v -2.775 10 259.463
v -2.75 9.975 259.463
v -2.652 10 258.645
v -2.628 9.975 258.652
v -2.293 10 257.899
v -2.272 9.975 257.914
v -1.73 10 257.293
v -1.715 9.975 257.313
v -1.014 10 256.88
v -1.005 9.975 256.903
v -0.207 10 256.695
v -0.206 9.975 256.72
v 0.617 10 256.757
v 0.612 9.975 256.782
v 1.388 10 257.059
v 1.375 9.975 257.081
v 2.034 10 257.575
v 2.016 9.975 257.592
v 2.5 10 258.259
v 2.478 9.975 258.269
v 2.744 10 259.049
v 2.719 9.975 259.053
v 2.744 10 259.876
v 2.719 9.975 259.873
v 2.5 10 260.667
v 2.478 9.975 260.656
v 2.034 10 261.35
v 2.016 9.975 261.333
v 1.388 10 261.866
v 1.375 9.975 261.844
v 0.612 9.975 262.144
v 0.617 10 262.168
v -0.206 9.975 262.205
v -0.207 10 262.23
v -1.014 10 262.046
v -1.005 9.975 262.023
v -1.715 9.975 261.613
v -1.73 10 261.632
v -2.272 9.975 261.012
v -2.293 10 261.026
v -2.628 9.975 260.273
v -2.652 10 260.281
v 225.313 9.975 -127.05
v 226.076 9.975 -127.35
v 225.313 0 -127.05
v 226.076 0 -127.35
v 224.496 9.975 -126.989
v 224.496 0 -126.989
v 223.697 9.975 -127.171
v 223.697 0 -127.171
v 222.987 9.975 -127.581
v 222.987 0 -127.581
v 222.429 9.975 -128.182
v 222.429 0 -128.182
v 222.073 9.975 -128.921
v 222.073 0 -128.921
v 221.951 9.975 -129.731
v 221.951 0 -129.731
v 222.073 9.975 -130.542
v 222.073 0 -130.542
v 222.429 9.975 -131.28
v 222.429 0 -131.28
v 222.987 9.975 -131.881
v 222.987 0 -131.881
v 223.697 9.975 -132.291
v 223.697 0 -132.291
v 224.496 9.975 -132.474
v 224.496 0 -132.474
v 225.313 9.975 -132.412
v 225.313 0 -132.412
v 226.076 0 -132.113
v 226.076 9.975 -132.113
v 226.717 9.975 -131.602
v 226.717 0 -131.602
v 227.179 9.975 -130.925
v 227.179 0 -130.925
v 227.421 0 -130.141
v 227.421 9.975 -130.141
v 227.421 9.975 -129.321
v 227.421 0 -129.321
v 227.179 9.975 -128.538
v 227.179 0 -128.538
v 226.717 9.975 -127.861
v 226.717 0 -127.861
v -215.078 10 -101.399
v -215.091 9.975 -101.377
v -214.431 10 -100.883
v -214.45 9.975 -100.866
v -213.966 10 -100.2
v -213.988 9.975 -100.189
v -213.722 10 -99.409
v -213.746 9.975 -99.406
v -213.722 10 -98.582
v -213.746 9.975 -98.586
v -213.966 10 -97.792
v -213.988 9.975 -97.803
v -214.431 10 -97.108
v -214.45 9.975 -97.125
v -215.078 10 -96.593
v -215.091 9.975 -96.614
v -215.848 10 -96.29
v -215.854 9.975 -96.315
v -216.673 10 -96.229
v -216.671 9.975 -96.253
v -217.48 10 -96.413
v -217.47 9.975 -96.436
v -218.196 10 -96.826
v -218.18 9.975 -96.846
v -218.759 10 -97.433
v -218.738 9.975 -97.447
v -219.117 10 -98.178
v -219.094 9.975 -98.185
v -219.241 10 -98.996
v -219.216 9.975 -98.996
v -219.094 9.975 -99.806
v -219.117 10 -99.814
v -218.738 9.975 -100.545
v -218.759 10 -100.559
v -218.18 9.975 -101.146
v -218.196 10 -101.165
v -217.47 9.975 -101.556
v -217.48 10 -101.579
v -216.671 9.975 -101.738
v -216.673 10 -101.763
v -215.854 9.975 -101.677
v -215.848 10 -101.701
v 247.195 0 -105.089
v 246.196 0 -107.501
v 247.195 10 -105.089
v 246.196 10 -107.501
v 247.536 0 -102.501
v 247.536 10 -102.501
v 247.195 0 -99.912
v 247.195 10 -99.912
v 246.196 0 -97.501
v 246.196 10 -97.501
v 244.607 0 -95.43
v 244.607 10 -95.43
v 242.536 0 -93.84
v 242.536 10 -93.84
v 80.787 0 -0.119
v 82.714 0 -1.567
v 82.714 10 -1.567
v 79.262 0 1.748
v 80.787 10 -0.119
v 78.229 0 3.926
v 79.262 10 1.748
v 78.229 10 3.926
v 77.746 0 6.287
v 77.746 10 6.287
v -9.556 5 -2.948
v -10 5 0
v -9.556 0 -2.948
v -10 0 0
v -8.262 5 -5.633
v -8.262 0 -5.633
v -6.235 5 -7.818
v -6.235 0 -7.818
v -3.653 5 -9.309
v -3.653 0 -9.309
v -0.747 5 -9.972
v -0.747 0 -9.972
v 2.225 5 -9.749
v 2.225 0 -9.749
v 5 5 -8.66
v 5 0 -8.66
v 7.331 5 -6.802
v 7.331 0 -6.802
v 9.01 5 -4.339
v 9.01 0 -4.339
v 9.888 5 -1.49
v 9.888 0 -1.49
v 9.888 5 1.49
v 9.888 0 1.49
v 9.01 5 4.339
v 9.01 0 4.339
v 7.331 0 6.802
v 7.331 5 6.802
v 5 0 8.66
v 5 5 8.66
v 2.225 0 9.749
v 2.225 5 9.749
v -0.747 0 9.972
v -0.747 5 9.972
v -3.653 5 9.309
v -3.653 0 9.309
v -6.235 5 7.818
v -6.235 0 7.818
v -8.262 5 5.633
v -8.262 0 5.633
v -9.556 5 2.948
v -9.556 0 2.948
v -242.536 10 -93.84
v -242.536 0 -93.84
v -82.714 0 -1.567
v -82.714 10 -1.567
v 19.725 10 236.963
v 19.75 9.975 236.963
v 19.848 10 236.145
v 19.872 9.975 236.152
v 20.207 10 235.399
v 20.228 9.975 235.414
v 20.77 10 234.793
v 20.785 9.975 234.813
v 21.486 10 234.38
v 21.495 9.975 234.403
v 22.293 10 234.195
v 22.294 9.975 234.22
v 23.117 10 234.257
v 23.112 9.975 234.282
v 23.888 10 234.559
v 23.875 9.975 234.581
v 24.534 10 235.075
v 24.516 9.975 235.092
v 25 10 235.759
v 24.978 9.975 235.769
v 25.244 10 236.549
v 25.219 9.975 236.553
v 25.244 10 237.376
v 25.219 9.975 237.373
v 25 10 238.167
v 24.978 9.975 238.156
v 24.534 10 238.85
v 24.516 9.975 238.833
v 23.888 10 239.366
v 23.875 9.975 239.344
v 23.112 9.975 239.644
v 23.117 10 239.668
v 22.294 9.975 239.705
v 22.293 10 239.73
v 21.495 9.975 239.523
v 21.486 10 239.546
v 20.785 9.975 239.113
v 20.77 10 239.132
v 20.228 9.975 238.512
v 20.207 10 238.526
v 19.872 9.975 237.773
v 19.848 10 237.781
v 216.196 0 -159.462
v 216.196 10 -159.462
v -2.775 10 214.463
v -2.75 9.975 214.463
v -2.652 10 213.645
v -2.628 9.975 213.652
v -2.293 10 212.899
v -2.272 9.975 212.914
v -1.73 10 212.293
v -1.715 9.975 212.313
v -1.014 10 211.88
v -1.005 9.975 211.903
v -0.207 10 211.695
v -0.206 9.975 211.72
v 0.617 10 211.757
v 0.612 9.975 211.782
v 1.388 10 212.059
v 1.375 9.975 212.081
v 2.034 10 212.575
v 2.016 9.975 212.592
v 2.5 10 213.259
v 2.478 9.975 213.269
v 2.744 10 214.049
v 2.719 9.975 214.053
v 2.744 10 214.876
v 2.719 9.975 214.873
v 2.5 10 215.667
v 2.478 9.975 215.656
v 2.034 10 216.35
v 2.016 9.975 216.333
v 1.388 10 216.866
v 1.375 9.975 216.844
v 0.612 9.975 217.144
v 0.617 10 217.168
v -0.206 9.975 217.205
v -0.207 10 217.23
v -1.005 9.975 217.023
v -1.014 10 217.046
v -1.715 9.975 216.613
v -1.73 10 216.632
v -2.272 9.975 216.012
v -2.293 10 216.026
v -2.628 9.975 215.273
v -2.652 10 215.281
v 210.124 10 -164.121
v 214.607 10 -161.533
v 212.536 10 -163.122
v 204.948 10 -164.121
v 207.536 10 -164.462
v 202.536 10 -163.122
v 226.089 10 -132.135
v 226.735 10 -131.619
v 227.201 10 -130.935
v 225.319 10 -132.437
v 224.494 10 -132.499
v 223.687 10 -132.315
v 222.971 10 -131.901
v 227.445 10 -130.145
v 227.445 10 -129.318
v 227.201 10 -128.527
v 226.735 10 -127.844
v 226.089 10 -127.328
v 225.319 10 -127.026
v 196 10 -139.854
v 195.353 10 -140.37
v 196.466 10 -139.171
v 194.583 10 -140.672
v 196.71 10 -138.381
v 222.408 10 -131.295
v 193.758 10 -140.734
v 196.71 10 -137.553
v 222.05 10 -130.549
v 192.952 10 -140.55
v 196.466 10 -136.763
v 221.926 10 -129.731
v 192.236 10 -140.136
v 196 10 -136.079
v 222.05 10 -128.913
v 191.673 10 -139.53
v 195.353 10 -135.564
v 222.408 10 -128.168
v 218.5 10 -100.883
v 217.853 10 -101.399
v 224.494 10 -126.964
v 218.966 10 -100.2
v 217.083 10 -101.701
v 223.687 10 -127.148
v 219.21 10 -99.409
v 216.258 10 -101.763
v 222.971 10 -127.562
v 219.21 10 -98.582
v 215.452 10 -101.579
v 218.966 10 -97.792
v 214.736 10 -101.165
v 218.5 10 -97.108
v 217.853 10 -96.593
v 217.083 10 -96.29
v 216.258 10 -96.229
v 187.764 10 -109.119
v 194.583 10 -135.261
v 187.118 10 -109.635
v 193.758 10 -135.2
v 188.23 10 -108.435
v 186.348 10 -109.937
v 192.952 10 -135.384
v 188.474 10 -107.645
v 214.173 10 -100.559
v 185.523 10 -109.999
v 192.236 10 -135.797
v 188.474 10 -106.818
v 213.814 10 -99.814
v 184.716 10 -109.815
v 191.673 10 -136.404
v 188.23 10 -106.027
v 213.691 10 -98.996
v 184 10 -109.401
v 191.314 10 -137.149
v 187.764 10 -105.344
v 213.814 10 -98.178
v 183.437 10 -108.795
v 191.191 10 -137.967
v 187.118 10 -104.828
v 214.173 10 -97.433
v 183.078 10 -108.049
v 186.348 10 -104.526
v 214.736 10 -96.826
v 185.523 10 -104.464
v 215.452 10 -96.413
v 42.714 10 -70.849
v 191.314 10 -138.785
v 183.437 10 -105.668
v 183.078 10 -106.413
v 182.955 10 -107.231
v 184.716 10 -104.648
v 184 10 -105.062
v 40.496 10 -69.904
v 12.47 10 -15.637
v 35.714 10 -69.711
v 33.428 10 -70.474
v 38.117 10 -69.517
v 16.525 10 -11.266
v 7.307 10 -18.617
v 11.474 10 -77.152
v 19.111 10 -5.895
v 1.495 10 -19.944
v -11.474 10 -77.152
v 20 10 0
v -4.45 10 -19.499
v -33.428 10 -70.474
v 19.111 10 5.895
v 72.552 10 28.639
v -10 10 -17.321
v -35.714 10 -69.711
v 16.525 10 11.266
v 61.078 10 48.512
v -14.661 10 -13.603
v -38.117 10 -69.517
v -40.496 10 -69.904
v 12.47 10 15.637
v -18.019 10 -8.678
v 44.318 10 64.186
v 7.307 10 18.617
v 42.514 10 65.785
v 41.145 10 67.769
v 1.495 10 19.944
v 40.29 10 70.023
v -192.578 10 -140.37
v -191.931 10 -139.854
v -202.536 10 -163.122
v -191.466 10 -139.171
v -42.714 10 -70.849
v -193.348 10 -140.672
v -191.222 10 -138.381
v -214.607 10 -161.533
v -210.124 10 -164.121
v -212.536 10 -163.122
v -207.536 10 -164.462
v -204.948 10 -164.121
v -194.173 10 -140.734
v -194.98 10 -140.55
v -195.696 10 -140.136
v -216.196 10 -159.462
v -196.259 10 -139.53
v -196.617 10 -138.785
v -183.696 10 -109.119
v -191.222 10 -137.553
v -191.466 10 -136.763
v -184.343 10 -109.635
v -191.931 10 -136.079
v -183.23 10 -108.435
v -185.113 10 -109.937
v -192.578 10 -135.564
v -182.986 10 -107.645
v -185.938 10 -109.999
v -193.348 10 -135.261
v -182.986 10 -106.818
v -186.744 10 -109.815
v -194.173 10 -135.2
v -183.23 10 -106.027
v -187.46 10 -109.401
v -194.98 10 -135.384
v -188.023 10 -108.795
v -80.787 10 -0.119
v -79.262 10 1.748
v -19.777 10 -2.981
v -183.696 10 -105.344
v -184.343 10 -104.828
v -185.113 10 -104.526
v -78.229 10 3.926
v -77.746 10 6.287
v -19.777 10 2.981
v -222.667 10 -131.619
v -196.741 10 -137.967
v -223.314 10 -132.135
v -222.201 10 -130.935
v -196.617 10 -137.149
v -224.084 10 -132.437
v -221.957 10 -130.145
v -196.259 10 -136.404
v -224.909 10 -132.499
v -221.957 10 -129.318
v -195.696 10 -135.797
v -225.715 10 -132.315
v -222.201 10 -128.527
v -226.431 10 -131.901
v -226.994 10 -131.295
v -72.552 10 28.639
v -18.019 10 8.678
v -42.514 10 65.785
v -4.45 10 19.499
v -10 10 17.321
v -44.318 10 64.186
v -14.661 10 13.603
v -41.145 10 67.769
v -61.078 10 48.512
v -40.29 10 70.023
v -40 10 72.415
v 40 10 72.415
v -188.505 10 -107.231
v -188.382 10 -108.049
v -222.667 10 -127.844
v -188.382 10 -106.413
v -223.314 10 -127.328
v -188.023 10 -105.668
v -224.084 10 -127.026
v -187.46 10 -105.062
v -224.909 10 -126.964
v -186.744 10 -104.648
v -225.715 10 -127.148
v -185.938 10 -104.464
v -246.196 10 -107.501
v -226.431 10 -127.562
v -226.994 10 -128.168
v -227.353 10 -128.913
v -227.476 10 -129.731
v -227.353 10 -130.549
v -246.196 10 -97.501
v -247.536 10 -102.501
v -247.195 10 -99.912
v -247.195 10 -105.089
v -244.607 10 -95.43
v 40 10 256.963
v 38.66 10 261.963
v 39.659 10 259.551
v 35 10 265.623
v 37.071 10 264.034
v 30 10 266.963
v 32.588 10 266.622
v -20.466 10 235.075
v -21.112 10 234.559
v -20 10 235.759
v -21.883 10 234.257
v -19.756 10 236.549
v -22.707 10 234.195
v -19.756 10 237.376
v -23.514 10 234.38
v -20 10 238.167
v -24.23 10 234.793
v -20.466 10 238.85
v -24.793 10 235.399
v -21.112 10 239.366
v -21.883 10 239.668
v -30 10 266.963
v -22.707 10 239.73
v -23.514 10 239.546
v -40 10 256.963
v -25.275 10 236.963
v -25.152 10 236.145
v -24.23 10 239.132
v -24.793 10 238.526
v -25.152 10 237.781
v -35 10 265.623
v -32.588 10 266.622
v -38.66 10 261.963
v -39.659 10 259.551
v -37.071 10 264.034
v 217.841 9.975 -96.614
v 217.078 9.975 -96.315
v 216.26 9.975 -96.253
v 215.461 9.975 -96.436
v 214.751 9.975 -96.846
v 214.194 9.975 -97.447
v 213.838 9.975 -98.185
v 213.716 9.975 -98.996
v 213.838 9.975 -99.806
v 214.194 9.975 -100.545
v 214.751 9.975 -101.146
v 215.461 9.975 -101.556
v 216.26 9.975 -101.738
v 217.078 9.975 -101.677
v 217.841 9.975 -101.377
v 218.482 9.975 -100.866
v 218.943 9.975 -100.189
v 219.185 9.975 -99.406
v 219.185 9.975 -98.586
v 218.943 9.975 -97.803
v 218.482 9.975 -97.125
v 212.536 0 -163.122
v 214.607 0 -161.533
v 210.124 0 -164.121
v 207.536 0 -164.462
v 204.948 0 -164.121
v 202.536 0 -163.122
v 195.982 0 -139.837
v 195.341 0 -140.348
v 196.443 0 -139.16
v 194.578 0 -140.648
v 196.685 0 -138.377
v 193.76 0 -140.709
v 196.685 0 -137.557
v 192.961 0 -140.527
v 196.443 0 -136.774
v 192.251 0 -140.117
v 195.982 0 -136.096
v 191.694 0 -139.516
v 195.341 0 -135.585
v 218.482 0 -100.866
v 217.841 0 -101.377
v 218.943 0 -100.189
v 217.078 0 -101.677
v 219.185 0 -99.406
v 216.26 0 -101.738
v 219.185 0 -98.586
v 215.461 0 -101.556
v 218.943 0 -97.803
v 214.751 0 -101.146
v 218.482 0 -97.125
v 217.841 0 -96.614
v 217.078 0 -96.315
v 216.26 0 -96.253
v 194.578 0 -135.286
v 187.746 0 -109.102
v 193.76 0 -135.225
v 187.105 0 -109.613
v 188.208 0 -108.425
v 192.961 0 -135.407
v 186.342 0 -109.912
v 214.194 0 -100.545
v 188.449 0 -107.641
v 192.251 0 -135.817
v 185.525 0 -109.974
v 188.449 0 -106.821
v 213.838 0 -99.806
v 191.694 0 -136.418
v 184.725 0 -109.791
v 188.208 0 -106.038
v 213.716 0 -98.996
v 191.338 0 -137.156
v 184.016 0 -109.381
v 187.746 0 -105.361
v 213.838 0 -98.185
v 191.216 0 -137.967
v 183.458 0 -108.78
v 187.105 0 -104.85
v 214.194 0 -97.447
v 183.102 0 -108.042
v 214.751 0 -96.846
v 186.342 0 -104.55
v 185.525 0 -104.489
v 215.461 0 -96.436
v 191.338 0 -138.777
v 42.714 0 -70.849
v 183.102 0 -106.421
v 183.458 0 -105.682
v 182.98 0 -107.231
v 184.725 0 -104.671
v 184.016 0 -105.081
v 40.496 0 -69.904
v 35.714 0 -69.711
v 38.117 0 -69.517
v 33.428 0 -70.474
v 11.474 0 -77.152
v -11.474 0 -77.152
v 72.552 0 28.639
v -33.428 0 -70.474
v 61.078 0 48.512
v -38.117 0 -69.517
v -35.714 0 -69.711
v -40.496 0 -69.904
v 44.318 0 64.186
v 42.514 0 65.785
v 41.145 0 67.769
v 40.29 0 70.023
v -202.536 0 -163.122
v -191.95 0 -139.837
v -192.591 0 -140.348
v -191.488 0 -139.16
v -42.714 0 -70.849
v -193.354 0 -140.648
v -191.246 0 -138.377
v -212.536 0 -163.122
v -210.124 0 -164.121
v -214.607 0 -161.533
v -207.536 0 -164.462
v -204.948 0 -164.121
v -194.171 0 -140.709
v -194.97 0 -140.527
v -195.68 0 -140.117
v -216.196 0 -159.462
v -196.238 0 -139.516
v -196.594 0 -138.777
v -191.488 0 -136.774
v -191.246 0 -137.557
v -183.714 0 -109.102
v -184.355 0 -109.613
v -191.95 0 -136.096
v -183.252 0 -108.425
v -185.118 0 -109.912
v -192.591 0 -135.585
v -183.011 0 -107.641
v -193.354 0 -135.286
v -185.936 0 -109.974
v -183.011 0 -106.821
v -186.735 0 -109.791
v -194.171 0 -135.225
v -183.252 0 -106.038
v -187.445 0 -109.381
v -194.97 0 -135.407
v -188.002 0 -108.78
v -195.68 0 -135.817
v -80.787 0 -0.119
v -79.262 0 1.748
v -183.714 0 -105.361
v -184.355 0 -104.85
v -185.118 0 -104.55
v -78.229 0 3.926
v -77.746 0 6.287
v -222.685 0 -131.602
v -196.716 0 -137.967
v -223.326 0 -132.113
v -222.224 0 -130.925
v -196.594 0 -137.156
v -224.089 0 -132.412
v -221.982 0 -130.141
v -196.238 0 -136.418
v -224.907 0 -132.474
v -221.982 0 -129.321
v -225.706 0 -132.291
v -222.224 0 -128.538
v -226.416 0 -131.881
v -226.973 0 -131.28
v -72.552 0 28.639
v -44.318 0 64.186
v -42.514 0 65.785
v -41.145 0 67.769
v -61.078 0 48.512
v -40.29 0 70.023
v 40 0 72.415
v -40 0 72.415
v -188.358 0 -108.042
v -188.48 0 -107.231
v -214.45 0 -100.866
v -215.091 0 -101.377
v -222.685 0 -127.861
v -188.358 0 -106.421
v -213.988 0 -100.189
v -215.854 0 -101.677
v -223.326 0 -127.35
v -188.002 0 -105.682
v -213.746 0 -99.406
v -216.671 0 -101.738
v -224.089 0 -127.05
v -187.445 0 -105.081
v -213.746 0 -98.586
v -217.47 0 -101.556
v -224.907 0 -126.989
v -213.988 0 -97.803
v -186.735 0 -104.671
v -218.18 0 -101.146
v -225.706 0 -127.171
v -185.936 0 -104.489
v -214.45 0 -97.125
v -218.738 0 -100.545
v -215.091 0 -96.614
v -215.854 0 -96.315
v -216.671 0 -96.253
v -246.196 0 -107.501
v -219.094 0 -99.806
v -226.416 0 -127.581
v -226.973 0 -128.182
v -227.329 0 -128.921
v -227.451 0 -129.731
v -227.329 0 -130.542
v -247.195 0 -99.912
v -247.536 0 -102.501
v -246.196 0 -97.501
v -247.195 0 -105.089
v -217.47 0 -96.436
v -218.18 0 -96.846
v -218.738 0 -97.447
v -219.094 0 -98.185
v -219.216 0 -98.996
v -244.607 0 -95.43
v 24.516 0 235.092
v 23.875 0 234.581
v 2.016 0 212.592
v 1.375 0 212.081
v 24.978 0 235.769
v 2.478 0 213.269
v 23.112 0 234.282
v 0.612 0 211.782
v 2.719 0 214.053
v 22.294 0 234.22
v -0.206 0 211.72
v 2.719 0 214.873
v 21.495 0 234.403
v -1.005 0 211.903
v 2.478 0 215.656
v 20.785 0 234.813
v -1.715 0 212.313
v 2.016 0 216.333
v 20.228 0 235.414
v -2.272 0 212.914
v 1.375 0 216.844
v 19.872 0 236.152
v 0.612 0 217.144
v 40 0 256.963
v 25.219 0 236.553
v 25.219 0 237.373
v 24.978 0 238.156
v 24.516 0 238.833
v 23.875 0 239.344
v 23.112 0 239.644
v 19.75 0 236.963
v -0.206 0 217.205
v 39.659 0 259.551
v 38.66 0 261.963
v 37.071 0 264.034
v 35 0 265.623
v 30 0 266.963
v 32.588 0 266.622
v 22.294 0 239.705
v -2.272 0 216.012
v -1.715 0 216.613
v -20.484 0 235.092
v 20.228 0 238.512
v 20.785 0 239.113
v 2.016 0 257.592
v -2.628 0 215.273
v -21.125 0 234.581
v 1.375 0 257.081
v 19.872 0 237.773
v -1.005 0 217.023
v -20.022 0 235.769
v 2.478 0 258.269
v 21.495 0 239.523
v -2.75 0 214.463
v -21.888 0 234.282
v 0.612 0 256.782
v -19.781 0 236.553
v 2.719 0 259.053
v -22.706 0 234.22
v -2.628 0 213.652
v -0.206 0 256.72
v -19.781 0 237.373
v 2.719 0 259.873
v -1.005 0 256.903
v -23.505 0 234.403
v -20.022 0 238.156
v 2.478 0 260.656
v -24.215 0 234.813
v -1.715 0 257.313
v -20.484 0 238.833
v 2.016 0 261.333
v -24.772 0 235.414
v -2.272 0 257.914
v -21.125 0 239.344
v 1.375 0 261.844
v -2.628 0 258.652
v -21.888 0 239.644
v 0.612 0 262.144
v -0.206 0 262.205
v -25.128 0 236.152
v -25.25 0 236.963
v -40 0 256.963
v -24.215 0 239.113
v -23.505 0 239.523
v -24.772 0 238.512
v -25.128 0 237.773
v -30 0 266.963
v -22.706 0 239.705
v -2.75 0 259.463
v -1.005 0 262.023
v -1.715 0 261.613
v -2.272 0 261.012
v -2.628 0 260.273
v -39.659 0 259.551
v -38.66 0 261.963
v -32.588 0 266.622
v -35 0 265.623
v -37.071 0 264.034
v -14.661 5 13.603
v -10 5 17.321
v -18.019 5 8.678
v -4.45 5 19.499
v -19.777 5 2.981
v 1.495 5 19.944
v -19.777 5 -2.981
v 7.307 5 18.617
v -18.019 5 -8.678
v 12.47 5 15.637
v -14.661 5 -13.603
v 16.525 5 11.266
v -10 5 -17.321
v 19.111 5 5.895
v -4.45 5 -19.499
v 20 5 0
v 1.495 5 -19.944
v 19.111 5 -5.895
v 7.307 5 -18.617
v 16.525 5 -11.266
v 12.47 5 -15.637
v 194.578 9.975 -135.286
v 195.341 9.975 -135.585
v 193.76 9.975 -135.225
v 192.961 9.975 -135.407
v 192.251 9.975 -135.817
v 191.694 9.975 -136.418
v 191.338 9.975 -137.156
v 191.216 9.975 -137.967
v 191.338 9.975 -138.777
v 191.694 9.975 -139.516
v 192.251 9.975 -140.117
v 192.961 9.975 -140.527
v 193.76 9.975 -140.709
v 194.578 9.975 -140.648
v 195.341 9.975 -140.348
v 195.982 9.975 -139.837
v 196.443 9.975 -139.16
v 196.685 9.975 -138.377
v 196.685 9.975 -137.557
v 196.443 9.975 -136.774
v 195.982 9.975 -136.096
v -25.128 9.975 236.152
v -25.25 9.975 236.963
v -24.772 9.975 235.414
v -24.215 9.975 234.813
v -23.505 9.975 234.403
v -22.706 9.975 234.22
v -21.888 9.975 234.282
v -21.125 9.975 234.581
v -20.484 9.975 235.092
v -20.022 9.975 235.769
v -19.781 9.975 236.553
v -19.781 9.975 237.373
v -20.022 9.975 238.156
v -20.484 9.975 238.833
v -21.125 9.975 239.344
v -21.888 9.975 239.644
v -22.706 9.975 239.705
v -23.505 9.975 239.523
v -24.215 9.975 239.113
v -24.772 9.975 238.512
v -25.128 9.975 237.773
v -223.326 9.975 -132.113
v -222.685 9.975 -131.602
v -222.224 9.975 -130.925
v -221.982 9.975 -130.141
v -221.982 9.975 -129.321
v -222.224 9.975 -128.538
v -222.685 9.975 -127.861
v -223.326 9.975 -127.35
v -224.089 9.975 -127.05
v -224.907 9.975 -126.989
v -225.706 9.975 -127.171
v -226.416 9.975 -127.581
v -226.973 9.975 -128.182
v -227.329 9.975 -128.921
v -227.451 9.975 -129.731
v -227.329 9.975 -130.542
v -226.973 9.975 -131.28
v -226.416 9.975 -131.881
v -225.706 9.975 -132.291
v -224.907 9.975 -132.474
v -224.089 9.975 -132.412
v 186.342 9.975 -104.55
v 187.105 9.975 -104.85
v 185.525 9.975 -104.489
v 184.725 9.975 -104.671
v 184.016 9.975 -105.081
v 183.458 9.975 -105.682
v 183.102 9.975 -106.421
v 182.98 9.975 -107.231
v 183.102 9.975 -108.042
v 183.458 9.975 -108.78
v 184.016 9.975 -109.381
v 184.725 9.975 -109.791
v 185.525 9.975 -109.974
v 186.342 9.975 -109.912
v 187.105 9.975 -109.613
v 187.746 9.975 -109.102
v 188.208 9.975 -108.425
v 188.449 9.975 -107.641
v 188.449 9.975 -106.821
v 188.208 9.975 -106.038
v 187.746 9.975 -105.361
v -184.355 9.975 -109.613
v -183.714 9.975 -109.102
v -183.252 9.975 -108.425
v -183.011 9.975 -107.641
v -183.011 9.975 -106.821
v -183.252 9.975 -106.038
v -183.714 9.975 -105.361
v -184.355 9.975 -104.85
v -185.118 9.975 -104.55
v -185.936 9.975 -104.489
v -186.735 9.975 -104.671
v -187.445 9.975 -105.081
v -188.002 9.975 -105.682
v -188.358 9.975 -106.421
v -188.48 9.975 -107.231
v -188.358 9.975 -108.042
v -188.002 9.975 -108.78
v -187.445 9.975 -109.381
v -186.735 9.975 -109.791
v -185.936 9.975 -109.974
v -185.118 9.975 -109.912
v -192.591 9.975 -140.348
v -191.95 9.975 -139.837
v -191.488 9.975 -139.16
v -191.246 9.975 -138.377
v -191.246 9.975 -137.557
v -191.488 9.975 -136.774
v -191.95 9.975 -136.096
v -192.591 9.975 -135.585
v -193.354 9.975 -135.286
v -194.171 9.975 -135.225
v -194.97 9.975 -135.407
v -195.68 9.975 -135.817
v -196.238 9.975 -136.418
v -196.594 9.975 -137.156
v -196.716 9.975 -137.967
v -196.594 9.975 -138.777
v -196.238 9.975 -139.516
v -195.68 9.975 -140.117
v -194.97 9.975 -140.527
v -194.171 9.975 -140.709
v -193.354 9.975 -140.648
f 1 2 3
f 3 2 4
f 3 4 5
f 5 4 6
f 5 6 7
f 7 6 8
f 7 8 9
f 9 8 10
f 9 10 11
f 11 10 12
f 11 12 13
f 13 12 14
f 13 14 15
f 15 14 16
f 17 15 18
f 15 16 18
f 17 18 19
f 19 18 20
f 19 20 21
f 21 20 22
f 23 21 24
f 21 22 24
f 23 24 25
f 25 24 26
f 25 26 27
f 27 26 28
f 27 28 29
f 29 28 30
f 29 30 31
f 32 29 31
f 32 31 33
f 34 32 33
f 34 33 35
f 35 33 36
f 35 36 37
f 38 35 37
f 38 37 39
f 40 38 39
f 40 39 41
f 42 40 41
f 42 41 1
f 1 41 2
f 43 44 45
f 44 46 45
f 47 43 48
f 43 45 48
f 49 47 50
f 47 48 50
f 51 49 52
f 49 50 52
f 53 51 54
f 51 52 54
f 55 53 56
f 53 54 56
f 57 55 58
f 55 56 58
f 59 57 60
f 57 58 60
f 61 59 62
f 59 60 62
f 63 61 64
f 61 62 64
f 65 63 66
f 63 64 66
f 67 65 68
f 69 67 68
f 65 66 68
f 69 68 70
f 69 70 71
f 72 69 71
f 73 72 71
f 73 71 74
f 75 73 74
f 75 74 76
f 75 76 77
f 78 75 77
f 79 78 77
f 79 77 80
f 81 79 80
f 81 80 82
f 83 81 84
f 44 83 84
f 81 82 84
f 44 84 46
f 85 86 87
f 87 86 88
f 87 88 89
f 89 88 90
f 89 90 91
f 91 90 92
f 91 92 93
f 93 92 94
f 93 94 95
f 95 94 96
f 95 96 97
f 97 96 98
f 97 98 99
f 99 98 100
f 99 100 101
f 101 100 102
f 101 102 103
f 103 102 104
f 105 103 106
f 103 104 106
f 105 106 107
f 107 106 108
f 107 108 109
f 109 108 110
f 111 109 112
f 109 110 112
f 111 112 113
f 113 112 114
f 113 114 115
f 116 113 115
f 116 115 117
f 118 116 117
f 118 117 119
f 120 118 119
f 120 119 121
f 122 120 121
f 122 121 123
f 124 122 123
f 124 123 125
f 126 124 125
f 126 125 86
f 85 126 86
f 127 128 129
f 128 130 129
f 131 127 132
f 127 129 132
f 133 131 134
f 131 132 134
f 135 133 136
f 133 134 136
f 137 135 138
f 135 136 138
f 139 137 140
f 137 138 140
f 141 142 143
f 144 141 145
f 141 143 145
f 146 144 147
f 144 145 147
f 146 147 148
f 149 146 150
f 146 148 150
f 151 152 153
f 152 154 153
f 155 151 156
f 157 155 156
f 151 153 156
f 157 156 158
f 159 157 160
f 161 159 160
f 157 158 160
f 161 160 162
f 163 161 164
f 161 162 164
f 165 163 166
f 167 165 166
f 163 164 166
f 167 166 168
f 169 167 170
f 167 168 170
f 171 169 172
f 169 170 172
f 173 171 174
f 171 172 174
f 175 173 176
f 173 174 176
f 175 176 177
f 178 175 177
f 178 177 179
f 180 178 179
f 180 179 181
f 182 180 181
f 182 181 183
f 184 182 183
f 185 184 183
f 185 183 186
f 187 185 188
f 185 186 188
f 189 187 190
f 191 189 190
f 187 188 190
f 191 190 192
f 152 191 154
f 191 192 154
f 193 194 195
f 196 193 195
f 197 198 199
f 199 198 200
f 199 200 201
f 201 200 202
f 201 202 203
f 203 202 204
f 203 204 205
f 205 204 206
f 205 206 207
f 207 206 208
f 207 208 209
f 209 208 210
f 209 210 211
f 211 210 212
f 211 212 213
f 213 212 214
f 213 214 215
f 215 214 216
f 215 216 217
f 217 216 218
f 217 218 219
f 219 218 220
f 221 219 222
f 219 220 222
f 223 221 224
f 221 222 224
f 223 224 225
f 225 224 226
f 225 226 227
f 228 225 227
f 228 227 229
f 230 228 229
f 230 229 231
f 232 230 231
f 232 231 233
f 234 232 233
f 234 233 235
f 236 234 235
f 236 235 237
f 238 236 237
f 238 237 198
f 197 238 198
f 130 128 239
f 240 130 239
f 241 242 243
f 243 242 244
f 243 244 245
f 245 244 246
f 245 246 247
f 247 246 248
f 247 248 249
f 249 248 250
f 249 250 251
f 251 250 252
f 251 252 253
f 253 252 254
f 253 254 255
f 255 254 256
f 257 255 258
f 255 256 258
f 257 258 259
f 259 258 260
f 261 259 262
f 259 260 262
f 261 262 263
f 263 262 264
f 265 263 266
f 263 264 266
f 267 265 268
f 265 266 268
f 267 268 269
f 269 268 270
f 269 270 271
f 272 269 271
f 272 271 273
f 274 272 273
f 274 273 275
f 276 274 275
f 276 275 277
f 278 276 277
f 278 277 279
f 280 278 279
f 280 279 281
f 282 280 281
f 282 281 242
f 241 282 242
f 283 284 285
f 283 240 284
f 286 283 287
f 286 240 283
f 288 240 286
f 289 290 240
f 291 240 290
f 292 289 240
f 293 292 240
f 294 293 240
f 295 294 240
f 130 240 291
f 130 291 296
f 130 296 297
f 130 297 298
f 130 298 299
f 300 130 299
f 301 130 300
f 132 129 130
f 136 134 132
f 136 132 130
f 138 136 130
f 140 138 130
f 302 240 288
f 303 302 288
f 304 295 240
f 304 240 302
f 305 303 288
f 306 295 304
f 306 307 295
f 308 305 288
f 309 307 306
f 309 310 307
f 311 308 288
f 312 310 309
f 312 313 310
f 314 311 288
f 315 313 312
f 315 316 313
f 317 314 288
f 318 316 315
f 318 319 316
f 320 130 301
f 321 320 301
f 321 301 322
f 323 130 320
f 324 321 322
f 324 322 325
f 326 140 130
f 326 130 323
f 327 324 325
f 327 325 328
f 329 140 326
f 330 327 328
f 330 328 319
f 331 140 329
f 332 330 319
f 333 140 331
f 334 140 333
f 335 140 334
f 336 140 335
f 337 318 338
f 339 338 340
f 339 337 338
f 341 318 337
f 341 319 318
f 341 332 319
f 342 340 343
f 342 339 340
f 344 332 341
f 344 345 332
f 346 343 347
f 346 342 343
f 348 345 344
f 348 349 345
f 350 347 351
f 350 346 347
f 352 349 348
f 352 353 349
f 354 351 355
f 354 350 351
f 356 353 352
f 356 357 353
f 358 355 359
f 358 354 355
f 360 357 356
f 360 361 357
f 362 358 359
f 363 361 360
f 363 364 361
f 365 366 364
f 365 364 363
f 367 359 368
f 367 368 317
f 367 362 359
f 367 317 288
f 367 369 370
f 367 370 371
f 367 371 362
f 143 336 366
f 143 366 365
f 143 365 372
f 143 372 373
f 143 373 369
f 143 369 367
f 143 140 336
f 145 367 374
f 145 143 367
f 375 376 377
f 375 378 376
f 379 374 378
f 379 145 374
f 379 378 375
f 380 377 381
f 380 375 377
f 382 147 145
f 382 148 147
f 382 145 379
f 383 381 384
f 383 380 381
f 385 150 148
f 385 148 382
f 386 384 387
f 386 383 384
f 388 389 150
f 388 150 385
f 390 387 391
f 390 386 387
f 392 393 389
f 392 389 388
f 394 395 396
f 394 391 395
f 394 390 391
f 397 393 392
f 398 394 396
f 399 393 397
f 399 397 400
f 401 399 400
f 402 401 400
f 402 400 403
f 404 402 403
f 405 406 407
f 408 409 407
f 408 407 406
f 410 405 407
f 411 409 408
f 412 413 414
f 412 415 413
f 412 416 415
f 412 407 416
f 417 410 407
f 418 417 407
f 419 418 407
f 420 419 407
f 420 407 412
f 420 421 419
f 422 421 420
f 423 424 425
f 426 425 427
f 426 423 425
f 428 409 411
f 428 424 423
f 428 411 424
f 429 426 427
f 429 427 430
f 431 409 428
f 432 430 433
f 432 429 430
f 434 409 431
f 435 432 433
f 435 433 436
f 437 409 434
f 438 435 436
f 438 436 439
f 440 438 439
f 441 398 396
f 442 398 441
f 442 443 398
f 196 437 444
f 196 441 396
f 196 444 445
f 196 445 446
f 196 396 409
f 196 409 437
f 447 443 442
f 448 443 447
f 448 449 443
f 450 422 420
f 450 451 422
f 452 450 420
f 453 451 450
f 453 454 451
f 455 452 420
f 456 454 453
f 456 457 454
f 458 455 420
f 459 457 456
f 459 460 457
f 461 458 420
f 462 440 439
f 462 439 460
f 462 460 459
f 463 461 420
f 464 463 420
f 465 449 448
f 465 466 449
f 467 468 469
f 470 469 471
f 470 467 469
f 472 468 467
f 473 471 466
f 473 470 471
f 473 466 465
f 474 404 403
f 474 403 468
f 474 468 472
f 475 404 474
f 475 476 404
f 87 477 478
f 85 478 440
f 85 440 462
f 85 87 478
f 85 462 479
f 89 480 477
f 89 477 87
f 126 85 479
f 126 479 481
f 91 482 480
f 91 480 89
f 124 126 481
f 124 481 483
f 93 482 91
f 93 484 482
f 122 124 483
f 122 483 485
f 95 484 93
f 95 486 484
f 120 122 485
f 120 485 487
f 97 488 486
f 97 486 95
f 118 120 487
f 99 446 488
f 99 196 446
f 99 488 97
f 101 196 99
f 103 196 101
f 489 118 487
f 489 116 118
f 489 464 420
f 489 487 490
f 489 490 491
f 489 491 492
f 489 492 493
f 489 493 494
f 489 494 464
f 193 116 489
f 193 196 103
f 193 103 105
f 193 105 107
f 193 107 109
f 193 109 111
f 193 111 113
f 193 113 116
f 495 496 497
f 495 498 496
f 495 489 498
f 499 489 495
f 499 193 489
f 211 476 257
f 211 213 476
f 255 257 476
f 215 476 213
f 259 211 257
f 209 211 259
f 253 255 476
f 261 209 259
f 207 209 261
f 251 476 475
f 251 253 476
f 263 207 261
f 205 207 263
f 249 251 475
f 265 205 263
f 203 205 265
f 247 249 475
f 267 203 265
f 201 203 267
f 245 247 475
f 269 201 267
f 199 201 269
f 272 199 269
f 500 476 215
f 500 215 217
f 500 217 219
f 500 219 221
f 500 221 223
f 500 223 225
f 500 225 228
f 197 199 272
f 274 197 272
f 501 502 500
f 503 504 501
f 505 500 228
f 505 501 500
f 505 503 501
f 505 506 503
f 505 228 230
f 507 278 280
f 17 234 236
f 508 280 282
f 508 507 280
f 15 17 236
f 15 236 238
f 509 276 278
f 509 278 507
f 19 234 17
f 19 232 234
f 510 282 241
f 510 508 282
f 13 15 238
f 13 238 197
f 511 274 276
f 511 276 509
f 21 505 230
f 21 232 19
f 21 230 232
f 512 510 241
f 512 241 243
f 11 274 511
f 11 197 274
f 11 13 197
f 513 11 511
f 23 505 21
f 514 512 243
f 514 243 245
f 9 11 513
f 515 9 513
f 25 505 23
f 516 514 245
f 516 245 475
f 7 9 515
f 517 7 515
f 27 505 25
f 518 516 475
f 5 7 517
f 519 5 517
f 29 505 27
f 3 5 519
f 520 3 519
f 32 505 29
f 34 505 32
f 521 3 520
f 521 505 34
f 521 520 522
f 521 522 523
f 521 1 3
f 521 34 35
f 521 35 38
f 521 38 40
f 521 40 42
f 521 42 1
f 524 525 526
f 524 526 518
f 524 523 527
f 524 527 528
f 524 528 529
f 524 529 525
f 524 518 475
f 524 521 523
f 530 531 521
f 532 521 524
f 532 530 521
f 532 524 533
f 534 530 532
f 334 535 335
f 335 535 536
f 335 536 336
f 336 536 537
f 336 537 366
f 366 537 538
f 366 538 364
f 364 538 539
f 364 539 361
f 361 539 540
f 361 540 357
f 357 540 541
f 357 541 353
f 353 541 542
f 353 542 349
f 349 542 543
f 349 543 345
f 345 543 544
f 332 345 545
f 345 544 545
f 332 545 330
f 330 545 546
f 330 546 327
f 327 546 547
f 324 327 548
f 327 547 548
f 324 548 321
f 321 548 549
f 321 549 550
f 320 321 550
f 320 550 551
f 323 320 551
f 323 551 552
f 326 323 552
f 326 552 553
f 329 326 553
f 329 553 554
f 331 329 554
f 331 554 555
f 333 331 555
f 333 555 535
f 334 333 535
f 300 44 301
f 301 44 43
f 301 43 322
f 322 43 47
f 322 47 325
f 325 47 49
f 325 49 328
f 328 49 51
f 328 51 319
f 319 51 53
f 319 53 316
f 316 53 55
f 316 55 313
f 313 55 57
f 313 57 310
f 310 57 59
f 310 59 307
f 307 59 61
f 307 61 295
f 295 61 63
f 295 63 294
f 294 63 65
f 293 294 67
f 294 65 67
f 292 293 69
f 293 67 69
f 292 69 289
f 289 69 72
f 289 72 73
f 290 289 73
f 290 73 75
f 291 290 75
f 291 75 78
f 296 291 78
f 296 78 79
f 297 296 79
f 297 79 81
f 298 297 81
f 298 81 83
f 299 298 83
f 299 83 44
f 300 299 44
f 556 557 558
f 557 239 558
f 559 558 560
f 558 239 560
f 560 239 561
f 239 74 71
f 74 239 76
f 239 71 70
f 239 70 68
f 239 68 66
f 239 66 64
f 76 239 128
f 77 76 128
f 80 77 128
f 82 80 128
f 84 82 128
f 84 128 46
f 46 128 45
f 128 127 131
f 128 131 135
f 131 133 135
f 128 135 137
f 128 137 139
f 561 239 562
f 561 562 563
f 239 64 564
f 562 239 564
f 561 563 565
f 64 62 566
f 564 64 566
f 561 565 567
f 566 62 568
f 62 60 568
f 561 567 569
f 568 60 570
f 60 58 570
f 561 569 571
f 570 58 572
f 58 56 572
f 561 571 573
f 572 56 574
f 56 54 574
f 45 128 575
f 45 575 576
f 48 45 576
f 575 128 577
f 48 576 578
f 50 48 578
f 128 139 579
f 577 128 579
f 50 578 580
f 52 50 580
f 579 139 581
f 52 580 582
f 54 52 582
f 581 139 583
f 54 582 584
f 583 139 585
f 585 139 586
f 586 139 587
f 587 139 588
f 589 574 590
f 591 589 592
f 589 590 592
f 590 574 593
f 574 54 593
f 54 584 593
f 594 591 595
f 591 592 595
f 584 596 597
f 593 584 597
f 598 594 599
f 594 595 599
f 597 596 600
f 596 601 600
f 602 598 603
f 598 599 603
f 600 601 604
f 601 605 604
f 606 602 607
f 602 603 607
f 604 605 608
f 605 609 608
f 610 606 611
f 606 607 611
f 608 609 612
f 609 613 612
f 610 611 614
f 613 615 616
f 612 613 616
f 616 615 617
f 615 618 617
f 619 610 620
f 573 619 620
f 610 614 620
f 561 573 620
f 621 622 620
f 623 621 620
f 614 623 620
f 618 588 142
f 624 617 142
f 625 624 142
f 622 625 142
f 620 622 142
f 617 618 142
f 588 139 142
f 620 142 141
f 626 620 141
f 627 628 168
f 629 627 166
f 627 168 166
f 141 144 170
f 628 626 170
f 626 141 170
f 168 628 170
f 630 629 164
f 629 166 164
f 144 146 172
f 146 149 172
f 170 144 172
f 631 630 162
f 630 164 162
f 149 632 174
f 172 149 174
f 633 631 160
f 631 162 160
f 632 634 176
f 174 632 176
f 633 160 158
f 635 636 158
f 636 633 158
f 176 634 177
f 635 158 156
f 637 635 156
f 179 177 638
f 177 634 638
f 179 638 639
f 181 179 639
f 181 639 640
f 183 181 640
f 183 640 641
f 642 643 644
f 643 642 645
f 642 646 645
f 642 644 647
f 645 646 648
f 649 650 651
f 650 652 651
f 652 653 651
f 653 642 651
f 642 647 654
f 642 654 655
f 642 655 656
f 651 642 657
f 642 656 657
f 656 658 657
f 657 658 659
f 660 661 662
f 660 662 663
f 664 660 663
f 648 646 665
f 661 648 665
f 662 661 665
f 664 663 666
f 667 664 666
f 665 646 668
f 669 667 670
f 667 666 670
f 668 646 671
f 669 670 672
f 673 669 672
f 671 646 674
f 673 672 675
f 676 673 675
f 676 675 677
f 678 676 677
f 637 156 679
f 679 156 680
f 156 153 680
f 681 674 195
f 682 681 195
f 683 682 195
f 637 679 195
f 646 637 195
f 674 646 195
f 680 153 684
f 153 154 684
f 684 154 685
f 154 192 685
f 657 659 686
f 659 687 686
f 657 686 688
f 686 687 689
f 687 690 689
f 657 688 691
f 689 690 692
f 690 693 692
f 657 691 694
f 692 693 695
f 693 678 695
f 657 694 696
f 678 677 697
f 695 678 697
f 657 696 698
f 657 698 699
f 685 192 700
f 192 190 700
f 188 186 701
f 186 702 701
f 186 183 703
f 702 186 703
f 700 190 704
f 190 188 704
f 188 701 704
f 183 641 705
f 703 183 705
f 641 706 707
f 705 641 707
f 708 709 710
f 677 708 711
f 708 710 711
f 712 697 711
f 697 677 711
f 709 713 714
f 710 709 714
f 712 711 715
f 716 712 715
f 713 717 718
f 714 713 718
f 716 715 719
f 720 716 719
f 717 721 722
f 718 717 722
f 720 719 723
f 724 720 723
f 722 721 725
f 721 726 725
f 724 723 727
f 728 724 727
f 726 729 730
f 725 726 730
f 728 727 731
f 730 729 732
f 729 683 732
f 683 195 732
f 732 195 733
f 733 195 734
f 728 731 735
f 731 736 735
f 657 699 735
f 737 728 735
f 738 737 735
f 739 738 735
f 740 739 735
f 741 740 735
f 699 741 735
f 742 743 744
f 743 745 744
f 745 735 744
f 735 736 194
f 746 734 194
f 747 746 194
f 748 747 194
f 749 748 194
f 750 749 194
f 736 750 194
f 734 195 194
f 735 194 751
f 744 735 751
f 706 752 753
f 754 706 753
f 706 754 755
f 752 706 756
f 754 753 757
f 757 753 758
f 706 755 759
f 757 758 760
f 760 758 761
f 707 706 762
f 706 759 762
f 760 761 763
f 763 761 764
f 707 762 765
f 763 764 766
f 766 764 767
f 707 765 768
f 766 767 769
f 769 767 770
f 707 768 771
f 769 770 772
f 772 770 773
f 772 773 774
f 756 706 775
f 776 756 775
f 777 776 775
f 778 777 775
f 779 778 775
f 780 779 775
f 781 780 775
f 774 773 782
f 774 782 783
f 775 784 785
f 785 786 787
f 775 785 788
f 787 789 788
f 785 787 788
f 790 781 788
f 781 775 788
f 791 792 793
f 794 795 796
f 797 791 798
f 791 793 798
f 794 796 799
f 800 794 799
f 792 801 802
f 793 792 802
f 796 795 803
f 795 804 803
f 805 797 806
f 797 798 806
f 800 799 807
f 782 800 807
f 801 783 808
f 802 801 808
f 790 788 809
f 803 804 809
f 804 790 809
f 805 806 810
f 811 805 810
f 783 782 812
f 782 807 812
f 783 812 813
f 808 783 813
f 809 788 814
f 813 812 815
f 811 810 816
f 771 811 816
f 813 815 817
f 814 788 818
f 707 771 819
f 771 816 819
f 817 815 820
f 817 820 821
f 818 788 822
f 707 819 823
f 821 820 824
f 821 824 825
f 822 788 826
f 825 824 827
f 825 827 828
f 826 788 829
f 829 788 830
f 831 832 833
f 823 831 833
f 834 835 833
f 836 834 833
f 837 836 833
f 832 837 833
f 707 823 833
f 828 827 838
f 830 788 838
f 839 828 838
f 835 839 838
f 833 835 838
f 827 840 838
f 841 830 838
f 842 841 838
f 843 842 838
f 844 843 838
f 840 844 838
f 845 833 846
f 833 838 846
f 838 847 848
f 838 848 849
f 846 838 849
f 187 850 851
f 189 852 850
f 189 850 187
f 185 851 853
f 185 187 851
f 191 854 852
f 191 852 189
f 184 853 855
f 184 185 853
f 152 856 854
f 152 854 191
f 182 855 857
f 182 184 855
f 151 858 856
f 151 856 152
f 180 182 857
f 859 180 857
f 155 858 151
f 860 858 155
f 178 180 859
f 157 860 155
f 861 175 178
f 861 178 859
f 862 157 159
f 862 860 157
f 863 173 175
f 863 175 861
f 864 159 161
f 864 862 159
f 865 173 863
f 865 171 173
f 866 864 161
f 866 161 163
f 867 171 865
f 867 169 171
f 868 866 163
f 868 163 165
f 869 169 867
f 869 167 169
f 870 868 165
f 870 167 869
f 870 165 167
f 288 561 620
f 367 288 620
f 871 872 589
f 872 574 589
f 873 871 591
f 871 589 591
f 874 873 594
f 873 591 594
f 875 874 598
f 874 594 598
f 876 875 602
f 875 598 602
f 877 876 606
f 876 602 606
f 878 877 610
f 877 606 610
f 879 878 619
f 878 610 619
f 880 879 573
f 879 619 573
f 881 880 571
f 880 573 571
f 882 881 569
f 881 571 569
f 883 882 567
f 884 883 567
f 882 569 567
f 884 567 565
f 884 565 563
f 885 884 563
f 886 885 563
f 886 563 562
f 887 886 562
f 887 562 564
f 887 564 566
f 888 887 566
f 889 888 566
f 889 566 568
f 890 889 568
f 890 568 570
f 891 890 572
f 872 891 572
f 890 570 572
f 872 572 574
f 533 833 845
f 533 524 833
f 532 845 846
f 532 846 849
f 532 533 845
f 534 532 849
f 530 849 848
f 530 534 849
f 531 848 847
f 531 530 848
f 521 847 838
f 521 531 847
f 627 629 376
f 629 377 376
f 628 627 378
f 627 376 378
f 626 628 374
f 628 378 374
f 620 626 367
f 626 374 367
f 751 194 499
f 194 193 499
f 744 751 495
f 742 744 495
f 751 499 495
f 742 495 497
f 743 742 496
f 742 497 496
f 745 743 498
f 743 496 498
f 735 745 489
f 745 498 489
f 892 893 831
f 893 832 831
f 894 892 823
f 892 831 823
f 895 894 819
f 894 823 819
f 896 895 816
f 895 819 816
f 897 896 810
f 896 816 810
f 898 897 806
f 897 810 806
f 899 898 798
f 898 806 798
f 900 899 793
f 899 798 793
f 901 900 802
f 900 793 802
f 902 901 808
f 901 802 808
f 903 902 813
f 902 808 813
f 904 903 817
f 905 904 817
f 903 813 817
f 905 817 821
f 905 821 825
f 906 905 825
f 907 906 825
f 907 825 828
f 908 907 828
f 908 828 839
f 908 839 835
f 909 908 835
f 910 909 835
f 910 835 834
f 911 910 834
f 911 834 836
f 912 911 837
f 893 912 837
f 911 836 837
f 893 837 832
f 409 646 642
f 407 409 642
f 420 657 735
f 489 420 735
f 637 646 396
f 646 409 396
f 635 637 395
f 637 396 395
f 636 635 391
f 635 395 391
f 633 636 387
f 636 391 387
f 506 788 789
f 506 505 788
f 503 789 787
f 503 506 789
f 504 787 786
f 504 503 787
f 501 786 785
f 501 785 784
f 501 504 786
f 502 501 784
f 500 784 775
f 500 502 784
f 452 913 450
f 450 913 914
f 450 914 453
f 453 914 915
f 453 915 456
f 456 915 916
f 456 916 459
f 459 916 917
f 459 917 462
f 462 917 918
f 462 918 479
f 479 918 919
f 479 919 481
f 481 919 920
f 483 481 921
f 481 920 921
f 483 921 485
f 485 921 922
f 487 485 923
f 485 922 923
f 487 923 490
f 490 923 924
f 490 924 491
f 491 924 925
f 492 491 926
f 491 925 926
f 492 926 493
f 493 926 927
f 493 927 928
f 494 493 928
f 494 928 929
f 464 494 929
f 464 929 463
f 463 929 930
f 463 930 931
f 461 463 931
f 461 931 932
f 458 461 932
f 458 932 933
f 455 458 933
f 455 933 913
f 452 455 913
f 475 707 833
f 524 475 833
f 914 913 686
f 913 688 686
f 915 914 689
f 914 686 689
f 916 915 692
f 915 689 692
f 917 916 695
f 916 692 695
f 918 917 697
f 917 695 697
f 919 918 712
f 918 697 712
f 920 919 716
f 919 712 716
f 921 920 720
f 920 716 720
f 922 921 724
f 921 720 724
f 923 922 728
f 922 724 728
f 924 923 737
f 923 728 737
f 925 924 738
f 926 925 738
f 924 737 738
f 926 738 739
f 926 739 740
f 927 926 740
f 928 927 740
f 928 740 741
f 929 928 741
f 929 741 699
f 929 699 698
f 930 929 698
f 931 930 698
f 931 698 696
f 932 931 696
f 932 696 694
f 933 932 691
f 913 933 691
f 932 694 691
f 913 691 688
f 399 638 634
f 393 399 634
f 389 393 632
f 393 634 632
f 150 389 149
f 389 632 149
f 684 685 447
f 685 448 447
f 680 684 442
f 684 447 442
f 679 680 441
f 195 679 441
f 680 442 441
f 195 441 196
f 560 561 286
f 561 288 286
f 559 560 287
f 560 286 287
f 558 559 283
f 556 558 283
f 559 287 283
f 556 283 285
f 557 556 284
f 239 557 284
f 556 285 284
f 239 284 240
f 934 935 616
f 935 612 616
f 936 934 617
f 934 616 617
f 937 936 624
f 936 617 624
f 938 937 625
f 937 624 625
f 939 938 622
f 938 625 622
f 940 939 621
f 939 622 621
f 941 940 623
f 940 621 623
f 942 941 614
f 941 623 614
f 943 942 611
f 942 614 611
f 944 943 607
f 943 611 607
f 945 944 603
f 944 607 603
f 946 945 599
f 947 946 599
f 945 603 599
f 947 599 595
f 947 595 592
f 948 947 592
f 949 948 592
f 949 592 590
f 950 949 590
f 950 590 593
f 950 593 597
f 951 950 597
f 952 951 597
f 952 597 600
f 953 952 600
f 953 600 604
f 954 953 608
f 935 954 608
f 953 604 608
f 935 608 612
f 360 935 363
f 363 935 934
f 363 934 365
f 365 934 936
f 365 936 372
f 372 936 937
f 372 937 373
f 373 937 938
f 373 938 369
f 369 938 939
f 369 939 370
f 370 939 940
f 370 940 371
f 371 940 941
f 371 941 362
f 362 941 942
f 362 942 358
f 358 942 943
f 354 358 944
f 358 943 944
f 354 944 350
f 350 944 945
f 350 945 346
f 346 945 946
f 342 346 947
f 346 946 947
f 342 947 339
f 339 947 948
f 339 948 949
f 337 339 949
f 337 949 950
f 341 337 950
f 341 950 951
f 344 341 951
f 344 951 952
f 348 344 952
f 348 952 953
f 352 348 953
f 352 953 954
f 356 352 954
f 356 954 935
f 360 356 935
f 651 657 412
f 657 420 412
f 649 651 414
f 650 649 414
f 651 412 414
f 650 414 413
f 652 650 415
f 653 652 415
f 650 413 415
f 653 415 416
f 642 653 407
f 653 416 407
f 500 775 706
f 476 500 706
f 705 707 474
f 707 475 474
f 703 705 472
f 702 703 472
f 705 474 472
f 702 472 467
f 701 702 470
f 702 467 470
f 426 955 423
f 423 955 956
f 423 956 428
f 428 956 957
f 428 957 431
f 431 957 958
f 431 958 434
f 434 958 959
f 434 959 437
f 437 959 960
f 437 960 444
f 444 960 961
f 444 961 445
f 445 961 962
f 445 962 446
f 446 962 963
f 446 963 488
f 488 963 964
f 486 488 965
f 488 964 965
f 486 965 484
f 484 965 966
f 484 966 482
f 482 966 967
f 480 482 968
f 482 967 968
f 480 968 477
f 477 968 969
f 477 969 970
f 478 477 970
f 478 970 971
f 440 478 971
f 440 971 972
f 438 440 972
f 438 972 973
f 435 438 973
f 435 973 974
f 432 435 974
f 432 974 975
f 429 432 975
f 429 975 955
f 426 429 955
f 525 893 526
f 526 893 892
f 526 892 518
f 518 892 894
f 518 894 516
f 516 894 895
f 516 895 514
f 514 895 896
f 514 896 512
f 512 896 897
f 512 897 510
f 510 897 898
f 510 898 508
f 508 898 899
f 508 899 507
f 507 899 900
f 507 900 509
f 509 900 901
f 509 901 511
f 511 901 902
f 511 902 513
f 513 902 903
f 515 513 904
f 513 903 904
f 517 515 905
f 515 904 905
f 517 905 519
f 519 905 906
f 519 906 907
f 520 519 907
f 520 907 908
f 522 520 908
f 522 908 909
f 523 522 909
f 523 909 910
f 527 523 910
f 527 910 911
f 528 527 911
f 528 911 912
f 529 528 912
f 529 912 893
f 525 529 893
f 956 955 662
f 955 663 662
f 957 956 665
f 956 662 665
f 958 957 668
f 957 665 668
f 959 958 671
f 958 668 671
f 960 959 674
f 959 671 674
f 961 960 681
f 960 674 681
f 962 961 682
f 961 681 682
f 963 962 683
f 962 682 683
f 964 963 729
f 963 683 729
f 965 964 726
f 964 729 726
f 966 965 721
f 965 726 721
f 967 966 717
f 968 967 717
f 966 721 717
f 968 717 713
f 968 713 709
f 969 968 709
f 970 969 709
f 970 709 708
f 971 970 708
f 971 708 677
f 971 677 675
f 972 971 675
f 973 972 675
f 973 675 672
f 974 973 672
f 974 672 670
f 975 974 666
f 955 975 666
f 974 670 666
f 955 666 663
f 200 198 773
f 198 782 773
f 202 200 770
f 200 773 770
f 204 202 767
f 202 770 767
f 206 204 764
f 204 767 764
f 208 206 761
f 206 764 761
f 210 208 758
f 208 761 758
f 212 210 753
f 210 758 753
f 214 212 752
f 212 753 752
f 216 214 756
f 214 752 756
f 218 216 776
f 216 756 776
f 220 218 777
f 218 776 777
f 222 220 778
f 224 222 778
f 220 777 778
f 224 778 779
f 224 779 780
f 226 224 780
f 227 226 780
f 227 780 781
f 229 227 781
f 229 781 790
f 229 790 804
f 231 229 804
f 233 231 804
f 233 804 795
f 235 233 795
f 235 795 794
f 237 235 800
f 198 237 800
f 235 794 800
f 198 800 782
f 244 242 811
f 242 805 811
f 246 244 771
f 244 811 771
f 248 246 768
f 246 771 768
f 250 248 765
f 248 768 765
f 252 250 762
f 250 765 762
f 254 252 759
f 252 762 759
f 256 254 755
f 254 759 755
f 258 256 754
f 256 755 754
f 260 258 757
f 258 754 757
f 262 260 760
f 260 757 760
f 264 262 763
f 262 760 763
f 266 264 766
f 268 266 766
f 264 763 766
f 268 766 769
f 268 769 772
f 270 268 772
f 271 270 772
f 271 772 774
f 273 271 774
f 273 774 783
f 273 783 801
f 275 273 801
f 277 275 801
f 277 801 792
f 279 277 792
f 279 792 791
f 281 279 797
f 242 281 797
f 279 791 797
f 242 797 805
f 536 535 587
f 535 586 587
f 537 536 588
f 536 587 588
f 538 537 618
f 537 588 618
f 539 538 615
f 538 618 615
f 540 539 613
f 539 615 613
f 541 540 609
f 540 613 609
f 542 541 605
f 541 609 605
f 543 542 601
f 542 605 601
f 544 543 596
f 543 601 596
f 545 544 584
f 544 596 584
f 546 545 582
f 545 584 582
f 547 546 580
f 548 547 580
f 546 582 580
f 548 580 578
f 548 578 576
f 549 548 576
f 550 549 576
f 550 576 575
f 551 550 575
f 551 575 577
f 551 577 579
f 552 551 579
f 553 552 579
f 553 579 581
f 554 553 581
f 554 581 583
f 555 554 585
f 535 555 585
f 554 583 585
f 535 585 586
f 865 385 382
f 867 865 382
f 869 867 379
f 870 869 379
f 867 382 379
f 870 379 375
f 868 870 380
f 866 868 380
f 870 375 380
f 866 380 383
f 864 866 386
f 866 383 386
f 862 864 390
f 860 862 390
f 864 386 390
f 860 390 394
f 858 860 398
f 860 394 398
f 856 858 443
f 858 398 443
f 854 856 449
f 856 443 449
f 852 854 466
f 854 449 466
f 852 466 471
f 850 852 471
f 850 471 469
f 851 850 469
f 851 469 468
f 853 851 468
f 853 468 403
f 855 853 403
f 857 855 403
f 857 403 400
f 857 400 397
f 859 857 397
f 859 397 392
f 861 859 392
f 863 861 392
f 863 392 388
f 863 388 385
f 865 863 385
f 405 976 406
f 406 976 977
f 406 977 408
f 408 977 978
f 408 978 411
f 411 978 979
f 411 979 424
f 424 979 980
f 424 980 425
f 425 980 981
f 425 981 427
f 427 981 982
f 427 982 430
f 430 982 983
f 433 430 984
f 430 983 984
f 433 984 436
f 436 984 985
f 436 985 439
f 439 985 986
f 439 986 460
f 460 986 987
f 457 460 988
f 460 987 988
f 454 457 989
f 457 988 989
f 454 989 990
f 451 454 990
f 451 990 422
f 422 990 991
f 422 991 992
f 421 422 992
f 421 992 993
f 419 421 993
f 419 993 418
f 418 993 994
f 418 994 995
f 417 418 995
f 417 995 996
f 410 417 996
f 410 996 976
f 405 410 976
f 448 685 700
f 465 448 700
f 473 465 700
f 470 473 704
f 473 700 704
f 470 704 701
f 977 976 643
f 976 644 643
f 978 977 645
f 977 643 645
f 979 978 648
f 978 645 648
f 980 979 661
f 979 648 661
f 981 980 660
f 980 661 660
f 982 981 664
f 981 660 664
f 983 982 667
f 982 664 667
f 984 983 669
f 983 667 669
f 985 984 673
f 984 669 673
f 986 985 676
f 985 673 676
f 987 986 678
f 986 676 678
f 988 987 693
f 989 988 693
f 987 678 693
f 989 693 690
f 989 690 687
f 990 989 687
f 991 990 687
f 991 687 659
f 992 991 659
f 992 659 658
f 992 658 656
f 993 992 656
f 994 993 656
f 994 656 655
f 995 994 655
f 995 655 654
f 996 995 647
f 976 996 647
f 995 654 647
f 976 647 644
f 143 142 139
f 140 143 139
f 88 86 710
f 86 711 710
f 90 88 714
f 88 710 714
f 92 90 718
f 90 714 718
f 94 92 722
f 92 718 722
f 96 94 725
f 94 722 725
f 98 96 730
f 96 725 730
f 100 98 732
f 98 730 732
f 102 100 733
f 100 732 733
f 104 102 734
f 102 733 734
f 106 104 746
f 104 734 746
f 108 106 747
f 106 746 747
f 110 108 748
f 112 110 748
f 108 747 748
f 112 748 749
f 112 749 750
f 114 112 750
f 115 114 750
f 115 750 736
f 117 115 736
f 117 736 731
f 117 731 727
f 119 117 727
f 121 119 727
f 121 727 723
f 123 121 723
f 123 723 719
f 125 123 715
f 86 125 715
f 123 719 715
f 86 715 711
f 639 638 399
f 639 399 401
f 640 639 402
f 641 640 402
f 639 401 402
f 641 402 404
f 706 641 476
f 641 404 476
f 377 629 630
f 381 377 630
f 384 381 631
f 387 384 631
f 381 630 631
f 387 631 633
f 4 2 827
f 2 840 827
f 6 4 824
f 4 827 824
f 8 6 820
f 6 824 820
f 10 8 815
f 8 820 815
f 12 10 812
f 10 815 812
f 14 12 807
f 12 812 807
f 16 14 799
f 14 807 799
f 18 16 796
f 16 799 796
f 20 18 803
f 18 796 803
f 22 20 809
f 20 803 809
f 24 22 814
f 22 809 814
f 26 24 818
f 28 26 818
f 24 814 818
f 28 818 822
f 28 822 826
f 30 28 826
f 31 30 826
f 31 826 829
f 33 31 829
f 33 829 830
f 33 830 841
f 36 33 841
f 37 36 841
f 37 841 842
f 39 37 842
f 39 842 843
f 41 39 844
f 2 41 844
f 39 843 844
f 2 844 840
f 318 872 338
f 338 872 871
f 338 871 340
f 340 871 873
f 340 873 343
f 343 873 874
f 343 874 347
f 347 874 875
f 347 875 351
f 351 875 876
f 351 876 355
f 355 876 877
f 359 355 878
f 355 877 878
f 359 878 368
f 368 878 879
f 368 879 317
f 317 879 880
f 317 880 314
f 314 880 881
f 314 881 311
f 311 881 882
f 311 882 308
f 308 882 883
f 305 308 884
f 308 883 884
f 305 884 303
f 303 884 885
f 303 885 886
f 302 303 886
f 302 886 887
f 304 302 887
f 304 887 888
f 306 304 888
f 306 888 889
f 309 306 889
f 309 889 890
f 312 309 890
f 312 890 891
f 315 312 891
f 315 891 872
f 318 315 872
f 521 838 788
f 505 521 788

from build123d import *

# Parameters (mm, degrees)
SKETCH1_R                      = 78
BOSS_EXTRUDE1_DEPTH            = 10
BOSS_EXTRUDE2_DEPTH            = 10
FILLET1_R                      = 10
M5_CLEARANCE_HOLE1_D           = 5.5
M5_CLEARANCE_HOLE1_CSINK_D     = 5.55
M5_CLEARANCE_HOLE1_CSINK_ANGLE = 90
CIRPATTERN1_COUNT              = 3
FILLET1_OF_CIRPATTERN1_R       = 10
HOLE1_D                        = 20
HOLE1_CBORE_D                  = 40
HOLE1_CBORE_DEPTH              = 5


with BuildPart() as part:
    # Sketch1 → Boss-Extrude1 (new body)
    with BuildSketch(Plane(origin=(0, 0, 0), x_dir=(1, 0, 0), z_dir=(0, 1, 0))):
        with Locations(Location((0, 0, 0), (0, 0, 270))):
            Circle(SKETCH1_R)
    extrude(amount=BOSS_EXTRUDE1_DEPTH)

    # Sketch4 → Boss-Extrude2 (add)
    with BuildSketch(Plane.XZ):
        with BuildLine():
            Line((-40, 66.962676171), (-40, 266.962676171))
            Line((-40, 266.962676171), (40, 266.962676171))
            Line((40, 266.962676171), (40, 66.962676171))
            ThreePointArc((40, 66.962676171), (0, 78), (-40, 66.962676171))
        make_face()
    boss_extrude2 = extrude(amount=-BOSS_EXTRUDE2_DEPTH)

    # Fillet1
    fillet1_edges = [part.edges().sort_by_distance(p)[0] for p in [
        (40, 5, 266.962676171),
        (-40, 5, 266.962676171),
        (-40, 5, 66.962676171),
        (40, 5, 66.962676171),
    ]]
    fillet(fillet1_edges, radius=FILLET1_R)

    # M5 Clearance Hole1 (through all)
    with Locations(Plane(origin=(0, 10, 0), x_dir=(1, 0, 0), z_dir=(0, 1, 0))):
        with Locations((0, -259.462676171), (-22.5, -236.962676171), (22.5, -236.962676171), (0, -214.462676171)):
            m5_clearance_hole1 = CounterSinkHole(M5_CLEARANCE_HOLE1_D / 2, M5_CLEARANCE_HOLE1_CSINK_D / 2, counter_sink_angle=M5_CLEARANCE_HOLE1_CSINK_ANGLE)

    # CirPattern1: Boss-Extrude2, M5 Clearance Hole1 ×3 about axis
    cirpattern1_axis = Axis((0, 0, 0), (0, 1, 0))
    add([boss_extrude2.rotate(cirpattern1_axis, i * 360 / CIRPATTERN1_COUNT) for i in range(1, CIRPATTERN1_COUNT)])
    add([m5_clearance_hole1.rotate(cirpattern1_axis, i * 360 / CIRPATTERN1_COUNT) for i in range(1, CIRPATTERN1_COUNT)], mode=Mode.SUBTRACT)

    # Fillet1 of CirPattern1
    fillet1_of_cirpattern1_edges = [part.edges().sort_by_distance(p)[0] for p in [
        (211.196459426, 5, -168.122354237),
        (251.196459426, 5, -98.840321934),
        (77.99137867, 5, 1.159678066),
        (37.99137867, 5, -68.122354237),
        (-251.196459426, 5, -98.840321934),
        (-211.196459426, 5, -168.122354237),
        (-37.99137867, 5, -68.122354237),
        (-77.99137867, 5, 1.159678066),
    ]]
    fillet(fillet1_of_cirpattern1_edges, radius=FILLET1_OF_CIRPATTERN1_R)

    # Hole1 (through all)
    with Locations(Plane(origin=(0, 10, 0), x_dir=(1, 0, 0), z_dir=(0, 1, 0))):
        with Locations((0, 0)):
            CounterBoreHole(HOLE1_D / 2, HOLE1_CBORE_D / 2, HOLE1_CBORE_DEPTH)


solid = part.part
